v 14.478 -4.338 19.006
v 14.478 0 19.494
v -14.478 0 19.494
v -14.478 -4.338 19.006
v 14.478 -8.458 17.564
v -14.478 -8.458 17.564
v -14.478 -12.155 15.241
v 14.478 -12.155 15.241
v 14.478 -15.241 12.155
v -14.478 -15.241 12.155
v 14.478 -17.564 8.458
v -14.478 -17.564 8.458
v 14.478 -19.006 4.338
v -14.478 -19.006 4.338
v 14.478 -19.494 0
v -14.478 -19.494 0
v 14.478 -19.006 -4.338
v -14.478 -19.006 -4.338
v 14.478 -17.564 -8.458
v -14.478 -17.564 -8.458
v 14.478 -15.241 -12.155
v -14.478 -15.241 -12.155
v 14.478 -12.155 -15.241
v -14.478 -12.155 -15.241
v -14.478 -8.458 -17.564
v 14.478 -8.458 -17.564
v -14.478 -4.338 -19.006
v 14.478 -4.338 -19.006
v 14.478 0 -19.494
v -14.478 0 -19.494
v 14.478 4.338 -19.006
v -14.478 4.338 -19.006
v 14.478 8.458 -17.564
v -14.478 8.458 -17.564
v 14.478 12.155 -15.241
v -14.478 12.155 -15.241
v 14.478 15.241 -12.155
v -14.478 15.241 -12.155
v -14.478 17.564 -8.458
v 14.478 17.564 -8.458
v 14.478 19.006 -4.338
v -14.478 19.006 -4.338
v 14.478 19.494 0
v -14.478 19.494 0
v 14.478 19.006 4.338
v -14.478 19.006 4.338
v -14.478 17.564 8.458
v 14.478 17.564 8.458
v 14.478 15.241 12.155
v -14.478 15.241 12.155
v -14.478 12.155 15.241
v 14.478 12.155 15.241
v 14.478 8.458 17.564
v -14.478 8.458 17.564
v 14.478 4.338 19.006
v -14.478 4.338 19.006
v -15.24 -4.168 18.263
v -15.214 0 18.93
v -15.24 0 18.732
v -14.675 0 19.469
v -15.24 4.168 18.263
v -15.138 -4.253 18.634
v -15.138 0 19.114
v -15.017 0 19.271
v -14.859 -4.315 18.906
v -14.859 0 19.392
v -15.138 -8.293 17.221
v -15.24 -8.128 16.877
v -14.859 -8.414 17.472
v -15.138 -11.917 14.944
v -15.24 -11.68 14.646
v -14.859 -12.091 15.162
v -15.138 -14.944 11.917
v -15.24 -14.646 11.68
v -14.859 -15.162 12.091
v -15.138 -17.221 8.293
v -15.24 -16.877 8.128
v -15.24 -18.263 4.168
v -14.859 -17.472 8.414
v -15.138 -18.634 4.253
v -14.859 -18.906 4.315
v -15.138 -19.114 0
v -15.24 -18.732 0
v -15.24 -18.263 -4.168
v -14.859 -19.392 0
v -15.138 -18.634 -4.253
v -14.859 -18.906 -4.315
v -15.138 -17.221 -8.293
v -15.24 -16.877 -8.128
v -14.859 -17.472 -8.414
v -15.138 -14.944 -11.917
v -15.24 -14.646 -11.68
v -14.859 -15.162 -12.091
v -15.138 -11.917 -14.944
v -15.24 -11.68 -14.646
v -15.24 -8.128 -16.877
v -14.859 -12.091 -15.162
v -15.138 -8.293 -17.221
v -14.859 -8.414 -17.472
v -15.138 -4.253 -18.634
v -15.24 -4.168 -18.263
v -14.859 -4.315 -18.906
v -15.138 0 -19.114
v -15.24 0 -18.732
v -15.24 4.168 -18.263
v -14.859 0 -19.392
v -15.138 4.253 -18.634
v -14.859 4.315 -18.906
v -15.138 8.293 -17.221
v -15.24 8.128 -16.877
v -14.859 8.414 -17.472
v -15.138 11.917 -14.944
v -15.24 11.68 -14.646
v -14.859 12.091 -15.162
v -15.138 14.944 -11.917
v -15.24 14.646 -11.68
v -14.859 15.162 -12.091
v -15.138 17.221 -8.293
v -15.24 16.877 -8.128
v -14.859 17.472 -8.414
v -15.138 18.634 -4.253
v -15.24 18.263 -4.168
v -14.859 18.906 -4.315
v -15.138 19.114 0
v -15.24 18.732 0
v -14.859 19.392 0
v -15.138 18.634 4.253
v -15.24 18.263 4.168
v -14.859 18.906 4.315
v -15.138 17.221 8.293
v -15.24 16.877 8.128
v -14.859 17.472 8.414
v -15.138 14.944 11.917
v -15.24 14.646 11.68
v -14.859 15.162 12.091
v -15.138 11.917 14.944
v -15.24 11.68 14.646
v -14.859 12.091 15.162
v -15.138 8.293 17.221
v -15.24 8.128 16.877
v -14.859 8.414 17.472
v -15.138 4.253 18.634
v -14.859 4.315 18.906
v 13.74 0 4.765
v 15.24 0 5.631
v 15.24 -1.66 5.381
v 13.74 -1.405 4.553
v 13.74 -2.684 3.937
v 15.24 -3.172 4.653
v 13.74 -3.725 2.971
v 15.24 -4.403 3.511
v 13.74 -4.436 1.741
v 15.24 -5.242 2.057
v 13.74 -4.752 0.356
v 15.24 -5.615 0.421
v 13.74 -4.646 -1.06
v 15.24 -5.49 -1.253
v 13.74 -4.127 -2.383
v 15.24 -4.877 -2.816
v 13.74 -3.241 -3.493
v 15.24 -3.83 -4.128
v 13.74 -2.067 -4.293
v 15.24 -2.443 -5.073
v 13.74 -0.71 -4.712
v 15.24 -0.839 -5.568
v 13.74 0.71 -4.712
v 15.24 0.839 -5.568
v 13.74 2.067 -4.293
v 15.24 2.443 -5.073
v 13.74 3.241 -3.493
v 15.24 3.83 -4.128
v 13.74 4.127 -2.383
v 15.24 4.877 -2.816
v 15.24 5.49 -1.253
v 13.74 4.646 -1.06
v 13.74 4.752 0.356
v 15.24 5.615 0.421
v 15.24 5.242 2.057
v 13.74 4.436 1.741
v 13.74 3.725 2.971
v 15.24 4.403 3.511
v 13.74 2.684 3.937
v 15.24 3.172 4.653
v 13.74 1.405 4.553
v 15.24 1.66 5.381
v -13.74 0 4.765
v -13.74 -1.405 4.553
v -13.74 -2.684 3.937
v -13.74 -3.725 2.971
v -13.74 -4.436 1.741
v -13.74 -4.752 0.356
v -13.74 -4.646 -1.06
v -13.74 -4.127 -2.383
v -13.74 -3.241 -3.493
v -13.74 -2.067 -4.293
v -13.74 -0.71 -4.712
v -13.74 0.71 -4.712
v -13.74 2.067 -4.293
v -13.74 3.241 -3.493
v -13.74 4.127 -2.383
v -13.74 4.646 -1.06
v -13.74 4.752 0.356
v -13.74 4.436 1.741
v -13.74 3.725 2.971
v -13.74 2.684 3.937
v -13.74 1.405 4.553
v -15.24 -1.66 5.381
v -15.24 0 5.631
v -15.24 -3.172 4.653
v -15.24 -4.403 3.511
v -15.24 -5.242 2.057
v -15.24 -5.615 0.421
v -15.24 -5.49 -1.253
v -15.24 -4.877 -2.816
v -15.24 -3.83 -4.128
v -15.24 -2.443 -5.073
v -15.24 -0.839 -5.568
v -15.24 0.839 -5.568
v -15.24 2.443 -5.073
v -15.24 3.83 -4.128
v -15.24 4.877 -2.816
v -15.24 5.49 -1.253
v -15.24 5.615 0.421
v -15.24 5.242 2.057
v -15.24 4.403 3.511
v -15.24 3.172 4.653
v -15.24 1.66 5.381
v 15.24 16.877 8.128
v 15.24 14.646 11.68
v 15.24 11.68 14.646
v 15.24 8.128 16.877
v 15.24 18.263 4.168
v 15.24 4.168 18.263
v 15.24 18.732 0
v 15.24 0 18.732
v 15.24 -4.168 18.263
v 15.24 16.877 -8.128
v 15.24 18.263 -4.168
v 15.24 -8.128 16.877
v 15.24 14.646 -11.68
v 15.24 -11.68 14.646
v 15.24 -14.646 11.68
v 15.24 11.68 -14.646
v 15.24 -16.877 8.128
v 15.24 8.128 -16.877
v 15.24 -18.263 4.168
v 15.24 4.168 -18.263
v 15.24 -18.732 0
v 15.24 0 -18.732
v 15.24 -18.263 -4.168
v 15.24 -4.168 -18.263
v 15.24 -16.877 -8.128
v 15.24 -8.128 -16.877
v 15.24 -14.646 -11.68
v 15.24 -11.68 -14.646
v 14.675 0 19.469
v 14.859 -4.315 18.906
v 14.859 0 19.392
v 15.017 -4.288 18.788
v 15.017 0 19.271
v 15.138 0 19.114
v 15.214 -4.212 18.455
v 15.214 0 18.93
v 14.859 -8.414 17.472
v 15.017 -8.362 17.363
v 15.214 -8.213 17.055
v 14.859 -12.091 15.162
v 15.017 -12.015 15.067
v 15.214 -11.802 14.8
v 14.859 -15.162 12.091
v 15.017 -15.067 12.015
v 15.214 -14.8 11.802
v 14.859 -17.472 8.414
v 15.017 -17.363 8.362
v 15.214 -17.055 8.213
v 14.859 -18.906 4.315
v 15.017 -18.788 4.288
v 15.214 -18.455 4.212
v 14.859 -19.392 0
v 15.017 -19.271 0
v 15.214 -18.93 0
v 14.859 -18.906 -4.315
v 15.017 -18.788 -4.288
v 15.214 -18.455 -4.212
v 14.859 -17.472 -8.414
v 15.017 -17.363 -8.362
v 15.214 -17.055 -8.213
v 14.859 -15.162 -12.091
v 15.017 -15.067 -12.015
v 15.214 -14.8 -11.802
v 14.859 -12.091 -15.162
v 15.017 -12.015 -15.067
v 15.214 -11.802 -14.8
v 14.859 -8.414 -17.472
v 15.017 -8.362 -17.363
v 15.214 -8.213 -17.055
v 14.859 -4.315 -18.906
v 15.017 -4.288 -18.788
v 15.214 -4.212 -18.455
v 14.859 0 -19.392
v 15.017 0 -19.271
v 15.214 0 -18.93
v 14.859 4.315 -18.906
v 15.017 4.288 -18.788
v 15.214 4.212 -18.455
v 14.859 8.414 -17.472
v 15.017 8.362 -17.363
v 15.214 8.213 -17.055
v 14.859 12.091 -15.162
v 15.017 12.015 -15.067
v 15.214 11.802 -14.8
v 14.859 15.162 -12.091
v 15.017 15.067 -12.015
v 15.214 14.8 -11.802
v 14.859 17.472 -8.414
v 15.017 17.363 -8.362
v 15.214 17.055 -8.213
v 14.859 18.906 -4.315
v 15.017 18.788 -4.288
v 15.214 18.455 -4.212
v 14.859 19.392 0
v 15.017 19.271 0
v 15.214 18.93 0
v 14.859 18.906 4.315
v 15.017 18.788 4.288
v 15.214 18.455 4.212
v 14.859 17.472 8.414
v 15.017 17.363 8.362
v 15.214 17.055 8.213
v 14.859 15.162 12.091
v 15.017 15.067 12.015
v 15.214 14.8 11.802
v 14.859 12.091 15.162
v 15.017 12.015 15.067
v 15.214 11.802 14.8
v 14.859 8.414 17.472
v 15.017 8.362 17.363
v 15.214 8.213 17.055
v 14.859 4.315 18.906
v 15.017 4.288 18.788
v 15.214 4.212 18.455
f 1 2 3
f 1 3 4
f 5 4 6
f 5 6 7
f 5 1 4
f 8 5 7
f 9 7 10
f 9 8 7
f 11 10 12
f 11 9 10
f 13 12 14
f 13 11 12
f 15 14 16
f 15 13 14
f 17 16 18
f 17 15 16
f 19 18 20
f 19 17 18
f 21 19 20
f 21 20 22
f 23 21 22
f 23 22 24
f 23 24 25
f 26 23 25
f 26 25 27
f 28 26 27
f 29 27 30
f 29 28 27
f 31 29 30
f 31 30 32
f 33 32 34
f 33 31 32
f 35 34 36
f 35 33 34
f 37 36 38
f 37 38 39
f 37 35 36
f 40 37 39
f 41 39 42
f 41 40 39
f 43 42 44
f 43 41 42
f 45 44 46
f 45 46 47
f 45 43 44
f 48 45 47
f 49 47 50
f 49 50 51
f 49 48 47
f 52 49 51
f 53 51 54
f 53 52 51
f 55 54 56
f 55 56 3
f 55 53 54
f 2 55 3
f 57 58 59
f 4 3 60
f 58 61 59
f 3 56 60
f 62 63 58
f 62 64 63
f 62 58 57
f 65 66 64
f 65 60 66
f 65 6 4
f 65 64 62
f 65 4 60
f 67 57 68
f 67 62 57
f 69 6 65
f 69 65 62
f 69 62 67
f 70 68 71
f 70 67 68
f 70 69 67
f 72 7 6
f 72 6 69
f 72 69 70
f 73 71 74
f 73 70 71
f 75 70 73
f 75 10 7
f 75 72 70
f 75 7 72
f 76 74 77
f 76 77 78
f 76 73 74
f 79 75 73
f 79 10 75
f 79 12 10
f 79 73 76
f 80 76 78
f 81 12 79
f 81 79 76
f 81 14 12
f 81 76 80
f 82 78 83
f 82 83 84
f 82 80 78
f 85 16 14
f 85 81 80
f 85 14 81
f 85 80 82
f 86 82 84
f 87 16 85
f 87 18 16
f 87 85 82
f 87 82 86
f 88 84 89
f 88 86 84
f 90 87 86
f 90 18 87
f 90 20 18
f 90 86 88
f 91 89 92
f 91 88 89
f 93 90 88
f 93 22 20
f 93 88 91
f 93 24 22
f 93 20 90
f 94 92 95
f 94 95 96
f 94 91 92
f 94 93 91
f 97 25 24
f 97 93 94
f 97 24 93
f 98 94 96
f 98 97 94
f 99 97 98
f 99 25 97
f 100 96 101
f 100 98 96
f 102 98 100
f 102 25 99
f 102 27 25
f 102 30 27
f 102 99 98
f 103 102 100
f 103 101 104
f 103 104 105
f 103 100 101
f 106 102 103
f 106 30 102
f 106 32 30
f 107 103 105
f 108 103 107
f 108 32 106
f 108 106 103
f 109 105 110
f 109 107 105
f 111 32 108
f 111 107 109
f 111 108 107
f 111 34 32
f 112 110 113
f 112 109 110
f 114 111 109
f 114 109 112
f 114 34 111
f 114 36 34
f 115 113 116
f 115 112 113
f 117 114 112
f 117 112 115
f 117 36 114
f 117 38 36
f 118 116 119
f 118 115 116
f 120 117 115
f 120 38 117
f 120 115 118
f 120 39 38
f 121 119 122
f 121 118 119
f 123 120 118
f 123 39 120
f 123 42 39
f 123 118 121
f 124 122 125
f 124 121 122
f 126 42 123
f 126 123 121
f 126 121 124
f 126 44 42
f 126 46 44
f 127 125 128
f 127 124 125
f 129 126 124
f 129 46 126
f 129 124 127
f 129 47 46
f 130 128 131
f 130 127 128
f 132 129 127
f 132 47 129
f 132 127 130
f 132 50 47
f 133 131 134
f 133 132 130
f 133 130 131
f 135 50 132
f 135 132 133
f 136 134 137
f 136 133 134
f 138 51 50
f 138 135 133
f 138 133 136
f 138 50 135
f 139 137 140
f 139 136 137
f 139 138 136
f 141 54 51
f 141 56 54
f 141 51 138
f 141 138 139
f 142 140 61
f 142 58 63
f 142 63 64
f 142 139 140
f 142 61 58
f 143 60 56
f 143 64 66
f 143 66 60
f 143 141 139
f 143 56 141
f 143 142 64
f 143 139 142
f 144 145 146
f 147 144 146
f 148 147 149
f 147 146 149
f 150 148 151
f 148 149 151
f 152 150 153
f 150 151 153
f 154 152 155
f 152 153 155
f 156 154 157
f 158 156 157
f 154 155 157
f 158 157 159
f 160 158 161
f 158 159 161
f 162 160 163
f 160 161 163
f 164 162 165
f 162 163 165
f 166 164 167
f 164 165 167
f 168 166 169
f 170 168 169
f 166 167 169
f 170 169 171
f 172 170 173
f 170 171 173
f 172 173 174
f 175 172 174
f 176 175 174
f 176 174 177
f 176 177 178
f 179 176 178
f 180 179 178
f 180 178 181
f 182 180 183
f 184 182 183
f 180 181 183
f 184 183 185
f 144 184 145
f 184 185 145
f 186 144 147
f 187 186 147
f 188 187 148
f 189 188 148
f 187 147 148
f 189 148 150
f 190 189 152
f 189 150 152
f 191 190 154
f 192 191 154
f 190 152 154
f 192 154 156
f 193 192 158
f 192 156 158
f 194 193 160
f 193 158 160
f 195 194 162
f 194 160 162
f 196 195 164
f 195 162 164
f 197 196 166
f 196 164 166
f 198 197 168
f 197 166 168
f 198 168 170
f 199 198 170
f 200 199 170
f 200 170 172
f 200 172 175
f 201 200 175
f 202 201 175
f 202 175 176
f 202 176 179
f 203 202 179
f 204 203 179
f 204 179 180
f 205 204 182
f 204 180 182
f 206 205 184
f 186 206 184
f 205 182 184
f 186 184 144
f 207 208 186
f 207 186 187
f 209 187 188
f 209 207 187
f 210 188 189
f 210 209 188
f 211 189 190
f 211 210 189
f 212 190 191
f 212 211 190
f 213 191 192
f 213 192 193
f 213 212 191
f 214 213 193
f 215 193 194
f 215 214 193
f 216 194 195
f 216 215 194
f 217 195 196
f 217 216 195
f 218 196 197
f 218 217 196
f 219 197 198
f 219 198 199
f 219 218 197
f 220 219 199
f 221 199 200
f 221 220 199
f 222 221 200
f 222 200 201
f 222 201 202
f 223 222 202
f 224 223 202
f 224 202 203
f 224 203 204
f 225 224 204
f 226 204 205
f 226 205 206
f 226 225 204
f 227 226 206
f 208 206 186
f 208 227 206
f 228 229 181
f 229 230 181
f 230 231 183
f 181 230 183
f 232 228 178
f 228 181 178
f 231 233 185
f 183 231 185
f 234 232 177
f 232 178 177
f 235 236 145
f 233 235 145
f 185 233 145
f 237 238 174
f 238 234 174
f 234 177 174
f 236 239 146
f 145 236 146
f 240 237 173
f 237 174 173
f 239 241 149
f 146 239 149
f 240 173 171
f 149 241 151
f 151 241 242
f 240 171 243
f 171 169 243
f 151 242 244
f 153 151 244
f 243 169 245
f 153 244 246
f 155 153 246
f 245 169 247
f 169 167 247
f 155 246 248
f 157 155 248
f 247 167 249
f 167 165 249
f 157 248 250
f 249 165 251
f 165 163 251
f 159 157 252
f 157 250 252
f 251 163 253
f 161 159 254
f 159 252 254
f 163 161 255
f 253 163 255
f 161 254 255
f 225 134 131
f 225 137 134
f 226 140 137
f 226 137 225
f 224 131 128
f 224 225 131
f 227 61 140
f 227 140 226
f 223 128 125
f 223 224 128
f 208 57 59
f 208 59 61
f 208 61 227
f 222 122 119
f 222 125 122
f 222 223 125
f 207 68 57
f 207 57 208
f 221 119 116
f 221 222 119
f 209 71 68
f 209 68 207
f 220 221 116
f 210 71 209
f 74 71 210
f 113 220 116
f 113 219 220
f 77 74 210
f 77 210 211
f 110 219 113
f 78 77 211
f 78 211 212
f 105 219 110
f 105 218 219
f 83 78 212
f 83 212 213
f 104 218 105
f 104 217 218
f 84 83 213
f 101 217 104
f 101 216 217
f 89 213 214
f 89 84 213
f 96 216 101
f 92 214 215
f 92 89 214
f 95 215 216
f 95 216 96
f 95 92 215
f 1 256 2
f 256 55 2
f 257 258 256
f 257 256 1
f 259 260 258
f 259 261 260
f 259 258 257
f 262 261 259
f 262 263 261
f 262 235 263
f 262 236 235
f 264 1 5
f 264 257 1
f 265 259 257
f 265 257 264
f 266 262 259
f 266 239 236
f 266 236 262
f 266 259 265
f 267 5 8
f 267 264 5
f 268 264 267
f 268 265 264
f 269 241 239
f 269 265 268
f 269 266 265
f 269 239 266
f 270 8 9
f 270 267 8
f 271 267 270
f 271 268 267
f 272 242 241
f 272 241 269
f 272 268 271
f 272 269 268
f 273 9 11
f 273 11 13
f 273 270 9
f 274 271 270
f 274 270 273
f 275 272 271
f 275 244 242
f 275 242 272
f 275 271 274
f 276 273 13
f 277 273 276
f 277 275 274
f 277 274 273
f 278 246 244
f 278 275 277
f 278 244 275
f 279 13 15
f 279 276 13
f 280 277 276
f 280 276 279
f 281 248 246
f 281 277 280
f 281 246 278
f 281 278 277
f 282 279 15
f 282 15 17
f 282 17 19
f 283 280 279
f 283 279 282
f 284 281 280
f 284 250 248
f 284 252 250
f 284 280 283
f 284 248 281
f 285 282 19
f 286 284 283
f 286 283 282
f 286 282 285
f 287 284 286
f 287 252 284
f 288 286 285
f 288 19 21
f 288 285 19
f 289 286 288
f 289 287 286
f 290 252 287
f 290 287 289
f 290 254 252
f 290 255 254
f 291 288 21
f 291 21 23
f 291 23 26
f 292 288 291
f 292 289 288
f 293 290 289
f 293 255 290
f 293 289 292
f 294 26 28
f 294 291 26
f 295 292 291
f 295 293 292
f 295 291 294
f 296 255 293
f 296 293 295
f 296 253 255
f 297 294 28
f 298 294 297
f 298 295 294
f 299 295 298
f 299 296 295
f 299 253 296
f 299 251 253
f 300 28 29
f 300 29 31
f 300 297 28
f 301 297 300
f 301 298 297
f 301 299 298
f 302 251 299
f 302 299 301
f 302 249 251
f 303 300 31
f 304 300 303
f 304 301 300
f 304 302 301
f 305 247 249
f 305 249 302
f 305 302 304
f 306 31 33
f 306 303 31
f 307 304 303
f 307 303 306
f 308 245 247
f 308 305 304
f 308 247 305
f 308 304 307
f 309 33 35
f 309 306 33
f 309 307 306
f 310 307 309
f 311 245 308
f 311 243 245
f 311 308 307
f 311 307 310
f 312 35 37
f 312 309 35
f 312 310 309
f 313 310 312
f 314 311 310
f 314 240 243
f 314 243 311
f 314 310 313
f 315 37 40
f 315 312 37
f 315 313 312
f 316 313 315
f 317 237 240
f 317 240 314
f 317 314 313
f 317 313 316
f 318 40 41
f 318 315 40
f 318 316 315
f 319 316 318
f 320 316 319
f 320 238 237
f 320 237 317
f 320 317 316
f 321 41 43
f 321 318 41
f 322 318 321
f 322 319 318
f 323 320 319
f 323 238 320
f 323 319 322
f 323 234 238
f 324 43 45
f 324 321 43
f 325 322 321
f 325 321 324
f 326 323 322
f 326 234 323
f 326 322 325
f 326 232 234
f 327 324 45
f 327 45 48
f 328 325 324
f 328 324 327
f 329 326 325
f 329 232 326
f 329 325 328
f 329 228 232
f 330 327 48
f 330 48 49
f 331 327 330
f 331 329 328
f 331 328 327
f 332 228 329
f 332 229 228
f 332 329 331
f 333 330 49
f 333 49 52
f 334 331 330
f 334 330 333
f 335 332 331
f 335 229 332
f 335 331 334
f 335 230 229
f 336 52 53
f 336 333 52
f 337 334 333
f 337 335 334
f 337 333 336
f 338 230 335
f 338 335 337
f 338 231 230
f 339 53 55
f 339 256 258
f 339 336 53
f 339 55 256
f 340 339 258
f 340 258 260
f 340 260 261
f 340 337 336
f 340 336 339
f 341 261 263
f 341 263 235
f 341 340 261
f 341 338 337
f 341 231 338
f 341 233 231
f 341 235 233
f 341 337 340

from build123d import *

# Parameters (mm, degrees)
SKETCH1_W      = 30.48
SKETCH1_H      = 14.7295
CHAMFER1_SIZE  = 1.5
CHAMFER1_SIZE2 = 0.866025404
FILLET1_R      = 0.762
CHAMFER2_SIZE  = 1.5
CHAMFER2_SIZE2 = 0.866025404


with BuildPart() as part:
    # Sketch1 → Revolve1 (revolve)
    with BuildSketch(Plane.XY, mode=Mode.PRIVATE) as revolve1_sk:
        with Locations((0, 12.12975)):
            Rectangle(SKETCH1_W, SKETCH1_H)
    revolve(revolve1_sk.sketch.rotate(Axis((-1000, 0, 0), (1, 0, 0)), 90), axis=Axis((-1000, 0, 0), (1, 0, 0)))

    # Chamfer1
    chamfer1_edges = [part.edges().sort_by_distance(p)[0] for p in [
        (-15.24, 0, -4.765),
    ]]
    chamfer1_side = [part.faces().sort_by_distance(p)[0] for p in [
        (0, 0, -4.765),
    ]]
    chamfer(chamfer1_edges, length=CHAMFER1_SIZE, length2=CHAMFER1_SIZE2, reference=chamfer1_side[0])

    # Fillet1
    fillet1_edges = [part.edges().sort_by_distance(p)[0] for p in [
        (15.24, 0, -19.4945),
        (-15.24, 0, -19.4945),
    ]]
    fillet(fillet1_edges, radius=FILLET1_R)

    # Chamfer2
    chamfer2_edges = [part.edges().sort_by_distance(p)[0] for p in [
        (15.24, 0, -4.765),
    ]]
    chamfer2_side = [part.faces().sort_by_distance(p)[0] for p in [
        (0.75, 0, -4.765),
    ]]
    chamfer(chamfer2_edges, length=CHAMFER2_SIZE, length2=CHAMFER2_SIZE2, reference=chamfer2_side[0])


solid = part.part
